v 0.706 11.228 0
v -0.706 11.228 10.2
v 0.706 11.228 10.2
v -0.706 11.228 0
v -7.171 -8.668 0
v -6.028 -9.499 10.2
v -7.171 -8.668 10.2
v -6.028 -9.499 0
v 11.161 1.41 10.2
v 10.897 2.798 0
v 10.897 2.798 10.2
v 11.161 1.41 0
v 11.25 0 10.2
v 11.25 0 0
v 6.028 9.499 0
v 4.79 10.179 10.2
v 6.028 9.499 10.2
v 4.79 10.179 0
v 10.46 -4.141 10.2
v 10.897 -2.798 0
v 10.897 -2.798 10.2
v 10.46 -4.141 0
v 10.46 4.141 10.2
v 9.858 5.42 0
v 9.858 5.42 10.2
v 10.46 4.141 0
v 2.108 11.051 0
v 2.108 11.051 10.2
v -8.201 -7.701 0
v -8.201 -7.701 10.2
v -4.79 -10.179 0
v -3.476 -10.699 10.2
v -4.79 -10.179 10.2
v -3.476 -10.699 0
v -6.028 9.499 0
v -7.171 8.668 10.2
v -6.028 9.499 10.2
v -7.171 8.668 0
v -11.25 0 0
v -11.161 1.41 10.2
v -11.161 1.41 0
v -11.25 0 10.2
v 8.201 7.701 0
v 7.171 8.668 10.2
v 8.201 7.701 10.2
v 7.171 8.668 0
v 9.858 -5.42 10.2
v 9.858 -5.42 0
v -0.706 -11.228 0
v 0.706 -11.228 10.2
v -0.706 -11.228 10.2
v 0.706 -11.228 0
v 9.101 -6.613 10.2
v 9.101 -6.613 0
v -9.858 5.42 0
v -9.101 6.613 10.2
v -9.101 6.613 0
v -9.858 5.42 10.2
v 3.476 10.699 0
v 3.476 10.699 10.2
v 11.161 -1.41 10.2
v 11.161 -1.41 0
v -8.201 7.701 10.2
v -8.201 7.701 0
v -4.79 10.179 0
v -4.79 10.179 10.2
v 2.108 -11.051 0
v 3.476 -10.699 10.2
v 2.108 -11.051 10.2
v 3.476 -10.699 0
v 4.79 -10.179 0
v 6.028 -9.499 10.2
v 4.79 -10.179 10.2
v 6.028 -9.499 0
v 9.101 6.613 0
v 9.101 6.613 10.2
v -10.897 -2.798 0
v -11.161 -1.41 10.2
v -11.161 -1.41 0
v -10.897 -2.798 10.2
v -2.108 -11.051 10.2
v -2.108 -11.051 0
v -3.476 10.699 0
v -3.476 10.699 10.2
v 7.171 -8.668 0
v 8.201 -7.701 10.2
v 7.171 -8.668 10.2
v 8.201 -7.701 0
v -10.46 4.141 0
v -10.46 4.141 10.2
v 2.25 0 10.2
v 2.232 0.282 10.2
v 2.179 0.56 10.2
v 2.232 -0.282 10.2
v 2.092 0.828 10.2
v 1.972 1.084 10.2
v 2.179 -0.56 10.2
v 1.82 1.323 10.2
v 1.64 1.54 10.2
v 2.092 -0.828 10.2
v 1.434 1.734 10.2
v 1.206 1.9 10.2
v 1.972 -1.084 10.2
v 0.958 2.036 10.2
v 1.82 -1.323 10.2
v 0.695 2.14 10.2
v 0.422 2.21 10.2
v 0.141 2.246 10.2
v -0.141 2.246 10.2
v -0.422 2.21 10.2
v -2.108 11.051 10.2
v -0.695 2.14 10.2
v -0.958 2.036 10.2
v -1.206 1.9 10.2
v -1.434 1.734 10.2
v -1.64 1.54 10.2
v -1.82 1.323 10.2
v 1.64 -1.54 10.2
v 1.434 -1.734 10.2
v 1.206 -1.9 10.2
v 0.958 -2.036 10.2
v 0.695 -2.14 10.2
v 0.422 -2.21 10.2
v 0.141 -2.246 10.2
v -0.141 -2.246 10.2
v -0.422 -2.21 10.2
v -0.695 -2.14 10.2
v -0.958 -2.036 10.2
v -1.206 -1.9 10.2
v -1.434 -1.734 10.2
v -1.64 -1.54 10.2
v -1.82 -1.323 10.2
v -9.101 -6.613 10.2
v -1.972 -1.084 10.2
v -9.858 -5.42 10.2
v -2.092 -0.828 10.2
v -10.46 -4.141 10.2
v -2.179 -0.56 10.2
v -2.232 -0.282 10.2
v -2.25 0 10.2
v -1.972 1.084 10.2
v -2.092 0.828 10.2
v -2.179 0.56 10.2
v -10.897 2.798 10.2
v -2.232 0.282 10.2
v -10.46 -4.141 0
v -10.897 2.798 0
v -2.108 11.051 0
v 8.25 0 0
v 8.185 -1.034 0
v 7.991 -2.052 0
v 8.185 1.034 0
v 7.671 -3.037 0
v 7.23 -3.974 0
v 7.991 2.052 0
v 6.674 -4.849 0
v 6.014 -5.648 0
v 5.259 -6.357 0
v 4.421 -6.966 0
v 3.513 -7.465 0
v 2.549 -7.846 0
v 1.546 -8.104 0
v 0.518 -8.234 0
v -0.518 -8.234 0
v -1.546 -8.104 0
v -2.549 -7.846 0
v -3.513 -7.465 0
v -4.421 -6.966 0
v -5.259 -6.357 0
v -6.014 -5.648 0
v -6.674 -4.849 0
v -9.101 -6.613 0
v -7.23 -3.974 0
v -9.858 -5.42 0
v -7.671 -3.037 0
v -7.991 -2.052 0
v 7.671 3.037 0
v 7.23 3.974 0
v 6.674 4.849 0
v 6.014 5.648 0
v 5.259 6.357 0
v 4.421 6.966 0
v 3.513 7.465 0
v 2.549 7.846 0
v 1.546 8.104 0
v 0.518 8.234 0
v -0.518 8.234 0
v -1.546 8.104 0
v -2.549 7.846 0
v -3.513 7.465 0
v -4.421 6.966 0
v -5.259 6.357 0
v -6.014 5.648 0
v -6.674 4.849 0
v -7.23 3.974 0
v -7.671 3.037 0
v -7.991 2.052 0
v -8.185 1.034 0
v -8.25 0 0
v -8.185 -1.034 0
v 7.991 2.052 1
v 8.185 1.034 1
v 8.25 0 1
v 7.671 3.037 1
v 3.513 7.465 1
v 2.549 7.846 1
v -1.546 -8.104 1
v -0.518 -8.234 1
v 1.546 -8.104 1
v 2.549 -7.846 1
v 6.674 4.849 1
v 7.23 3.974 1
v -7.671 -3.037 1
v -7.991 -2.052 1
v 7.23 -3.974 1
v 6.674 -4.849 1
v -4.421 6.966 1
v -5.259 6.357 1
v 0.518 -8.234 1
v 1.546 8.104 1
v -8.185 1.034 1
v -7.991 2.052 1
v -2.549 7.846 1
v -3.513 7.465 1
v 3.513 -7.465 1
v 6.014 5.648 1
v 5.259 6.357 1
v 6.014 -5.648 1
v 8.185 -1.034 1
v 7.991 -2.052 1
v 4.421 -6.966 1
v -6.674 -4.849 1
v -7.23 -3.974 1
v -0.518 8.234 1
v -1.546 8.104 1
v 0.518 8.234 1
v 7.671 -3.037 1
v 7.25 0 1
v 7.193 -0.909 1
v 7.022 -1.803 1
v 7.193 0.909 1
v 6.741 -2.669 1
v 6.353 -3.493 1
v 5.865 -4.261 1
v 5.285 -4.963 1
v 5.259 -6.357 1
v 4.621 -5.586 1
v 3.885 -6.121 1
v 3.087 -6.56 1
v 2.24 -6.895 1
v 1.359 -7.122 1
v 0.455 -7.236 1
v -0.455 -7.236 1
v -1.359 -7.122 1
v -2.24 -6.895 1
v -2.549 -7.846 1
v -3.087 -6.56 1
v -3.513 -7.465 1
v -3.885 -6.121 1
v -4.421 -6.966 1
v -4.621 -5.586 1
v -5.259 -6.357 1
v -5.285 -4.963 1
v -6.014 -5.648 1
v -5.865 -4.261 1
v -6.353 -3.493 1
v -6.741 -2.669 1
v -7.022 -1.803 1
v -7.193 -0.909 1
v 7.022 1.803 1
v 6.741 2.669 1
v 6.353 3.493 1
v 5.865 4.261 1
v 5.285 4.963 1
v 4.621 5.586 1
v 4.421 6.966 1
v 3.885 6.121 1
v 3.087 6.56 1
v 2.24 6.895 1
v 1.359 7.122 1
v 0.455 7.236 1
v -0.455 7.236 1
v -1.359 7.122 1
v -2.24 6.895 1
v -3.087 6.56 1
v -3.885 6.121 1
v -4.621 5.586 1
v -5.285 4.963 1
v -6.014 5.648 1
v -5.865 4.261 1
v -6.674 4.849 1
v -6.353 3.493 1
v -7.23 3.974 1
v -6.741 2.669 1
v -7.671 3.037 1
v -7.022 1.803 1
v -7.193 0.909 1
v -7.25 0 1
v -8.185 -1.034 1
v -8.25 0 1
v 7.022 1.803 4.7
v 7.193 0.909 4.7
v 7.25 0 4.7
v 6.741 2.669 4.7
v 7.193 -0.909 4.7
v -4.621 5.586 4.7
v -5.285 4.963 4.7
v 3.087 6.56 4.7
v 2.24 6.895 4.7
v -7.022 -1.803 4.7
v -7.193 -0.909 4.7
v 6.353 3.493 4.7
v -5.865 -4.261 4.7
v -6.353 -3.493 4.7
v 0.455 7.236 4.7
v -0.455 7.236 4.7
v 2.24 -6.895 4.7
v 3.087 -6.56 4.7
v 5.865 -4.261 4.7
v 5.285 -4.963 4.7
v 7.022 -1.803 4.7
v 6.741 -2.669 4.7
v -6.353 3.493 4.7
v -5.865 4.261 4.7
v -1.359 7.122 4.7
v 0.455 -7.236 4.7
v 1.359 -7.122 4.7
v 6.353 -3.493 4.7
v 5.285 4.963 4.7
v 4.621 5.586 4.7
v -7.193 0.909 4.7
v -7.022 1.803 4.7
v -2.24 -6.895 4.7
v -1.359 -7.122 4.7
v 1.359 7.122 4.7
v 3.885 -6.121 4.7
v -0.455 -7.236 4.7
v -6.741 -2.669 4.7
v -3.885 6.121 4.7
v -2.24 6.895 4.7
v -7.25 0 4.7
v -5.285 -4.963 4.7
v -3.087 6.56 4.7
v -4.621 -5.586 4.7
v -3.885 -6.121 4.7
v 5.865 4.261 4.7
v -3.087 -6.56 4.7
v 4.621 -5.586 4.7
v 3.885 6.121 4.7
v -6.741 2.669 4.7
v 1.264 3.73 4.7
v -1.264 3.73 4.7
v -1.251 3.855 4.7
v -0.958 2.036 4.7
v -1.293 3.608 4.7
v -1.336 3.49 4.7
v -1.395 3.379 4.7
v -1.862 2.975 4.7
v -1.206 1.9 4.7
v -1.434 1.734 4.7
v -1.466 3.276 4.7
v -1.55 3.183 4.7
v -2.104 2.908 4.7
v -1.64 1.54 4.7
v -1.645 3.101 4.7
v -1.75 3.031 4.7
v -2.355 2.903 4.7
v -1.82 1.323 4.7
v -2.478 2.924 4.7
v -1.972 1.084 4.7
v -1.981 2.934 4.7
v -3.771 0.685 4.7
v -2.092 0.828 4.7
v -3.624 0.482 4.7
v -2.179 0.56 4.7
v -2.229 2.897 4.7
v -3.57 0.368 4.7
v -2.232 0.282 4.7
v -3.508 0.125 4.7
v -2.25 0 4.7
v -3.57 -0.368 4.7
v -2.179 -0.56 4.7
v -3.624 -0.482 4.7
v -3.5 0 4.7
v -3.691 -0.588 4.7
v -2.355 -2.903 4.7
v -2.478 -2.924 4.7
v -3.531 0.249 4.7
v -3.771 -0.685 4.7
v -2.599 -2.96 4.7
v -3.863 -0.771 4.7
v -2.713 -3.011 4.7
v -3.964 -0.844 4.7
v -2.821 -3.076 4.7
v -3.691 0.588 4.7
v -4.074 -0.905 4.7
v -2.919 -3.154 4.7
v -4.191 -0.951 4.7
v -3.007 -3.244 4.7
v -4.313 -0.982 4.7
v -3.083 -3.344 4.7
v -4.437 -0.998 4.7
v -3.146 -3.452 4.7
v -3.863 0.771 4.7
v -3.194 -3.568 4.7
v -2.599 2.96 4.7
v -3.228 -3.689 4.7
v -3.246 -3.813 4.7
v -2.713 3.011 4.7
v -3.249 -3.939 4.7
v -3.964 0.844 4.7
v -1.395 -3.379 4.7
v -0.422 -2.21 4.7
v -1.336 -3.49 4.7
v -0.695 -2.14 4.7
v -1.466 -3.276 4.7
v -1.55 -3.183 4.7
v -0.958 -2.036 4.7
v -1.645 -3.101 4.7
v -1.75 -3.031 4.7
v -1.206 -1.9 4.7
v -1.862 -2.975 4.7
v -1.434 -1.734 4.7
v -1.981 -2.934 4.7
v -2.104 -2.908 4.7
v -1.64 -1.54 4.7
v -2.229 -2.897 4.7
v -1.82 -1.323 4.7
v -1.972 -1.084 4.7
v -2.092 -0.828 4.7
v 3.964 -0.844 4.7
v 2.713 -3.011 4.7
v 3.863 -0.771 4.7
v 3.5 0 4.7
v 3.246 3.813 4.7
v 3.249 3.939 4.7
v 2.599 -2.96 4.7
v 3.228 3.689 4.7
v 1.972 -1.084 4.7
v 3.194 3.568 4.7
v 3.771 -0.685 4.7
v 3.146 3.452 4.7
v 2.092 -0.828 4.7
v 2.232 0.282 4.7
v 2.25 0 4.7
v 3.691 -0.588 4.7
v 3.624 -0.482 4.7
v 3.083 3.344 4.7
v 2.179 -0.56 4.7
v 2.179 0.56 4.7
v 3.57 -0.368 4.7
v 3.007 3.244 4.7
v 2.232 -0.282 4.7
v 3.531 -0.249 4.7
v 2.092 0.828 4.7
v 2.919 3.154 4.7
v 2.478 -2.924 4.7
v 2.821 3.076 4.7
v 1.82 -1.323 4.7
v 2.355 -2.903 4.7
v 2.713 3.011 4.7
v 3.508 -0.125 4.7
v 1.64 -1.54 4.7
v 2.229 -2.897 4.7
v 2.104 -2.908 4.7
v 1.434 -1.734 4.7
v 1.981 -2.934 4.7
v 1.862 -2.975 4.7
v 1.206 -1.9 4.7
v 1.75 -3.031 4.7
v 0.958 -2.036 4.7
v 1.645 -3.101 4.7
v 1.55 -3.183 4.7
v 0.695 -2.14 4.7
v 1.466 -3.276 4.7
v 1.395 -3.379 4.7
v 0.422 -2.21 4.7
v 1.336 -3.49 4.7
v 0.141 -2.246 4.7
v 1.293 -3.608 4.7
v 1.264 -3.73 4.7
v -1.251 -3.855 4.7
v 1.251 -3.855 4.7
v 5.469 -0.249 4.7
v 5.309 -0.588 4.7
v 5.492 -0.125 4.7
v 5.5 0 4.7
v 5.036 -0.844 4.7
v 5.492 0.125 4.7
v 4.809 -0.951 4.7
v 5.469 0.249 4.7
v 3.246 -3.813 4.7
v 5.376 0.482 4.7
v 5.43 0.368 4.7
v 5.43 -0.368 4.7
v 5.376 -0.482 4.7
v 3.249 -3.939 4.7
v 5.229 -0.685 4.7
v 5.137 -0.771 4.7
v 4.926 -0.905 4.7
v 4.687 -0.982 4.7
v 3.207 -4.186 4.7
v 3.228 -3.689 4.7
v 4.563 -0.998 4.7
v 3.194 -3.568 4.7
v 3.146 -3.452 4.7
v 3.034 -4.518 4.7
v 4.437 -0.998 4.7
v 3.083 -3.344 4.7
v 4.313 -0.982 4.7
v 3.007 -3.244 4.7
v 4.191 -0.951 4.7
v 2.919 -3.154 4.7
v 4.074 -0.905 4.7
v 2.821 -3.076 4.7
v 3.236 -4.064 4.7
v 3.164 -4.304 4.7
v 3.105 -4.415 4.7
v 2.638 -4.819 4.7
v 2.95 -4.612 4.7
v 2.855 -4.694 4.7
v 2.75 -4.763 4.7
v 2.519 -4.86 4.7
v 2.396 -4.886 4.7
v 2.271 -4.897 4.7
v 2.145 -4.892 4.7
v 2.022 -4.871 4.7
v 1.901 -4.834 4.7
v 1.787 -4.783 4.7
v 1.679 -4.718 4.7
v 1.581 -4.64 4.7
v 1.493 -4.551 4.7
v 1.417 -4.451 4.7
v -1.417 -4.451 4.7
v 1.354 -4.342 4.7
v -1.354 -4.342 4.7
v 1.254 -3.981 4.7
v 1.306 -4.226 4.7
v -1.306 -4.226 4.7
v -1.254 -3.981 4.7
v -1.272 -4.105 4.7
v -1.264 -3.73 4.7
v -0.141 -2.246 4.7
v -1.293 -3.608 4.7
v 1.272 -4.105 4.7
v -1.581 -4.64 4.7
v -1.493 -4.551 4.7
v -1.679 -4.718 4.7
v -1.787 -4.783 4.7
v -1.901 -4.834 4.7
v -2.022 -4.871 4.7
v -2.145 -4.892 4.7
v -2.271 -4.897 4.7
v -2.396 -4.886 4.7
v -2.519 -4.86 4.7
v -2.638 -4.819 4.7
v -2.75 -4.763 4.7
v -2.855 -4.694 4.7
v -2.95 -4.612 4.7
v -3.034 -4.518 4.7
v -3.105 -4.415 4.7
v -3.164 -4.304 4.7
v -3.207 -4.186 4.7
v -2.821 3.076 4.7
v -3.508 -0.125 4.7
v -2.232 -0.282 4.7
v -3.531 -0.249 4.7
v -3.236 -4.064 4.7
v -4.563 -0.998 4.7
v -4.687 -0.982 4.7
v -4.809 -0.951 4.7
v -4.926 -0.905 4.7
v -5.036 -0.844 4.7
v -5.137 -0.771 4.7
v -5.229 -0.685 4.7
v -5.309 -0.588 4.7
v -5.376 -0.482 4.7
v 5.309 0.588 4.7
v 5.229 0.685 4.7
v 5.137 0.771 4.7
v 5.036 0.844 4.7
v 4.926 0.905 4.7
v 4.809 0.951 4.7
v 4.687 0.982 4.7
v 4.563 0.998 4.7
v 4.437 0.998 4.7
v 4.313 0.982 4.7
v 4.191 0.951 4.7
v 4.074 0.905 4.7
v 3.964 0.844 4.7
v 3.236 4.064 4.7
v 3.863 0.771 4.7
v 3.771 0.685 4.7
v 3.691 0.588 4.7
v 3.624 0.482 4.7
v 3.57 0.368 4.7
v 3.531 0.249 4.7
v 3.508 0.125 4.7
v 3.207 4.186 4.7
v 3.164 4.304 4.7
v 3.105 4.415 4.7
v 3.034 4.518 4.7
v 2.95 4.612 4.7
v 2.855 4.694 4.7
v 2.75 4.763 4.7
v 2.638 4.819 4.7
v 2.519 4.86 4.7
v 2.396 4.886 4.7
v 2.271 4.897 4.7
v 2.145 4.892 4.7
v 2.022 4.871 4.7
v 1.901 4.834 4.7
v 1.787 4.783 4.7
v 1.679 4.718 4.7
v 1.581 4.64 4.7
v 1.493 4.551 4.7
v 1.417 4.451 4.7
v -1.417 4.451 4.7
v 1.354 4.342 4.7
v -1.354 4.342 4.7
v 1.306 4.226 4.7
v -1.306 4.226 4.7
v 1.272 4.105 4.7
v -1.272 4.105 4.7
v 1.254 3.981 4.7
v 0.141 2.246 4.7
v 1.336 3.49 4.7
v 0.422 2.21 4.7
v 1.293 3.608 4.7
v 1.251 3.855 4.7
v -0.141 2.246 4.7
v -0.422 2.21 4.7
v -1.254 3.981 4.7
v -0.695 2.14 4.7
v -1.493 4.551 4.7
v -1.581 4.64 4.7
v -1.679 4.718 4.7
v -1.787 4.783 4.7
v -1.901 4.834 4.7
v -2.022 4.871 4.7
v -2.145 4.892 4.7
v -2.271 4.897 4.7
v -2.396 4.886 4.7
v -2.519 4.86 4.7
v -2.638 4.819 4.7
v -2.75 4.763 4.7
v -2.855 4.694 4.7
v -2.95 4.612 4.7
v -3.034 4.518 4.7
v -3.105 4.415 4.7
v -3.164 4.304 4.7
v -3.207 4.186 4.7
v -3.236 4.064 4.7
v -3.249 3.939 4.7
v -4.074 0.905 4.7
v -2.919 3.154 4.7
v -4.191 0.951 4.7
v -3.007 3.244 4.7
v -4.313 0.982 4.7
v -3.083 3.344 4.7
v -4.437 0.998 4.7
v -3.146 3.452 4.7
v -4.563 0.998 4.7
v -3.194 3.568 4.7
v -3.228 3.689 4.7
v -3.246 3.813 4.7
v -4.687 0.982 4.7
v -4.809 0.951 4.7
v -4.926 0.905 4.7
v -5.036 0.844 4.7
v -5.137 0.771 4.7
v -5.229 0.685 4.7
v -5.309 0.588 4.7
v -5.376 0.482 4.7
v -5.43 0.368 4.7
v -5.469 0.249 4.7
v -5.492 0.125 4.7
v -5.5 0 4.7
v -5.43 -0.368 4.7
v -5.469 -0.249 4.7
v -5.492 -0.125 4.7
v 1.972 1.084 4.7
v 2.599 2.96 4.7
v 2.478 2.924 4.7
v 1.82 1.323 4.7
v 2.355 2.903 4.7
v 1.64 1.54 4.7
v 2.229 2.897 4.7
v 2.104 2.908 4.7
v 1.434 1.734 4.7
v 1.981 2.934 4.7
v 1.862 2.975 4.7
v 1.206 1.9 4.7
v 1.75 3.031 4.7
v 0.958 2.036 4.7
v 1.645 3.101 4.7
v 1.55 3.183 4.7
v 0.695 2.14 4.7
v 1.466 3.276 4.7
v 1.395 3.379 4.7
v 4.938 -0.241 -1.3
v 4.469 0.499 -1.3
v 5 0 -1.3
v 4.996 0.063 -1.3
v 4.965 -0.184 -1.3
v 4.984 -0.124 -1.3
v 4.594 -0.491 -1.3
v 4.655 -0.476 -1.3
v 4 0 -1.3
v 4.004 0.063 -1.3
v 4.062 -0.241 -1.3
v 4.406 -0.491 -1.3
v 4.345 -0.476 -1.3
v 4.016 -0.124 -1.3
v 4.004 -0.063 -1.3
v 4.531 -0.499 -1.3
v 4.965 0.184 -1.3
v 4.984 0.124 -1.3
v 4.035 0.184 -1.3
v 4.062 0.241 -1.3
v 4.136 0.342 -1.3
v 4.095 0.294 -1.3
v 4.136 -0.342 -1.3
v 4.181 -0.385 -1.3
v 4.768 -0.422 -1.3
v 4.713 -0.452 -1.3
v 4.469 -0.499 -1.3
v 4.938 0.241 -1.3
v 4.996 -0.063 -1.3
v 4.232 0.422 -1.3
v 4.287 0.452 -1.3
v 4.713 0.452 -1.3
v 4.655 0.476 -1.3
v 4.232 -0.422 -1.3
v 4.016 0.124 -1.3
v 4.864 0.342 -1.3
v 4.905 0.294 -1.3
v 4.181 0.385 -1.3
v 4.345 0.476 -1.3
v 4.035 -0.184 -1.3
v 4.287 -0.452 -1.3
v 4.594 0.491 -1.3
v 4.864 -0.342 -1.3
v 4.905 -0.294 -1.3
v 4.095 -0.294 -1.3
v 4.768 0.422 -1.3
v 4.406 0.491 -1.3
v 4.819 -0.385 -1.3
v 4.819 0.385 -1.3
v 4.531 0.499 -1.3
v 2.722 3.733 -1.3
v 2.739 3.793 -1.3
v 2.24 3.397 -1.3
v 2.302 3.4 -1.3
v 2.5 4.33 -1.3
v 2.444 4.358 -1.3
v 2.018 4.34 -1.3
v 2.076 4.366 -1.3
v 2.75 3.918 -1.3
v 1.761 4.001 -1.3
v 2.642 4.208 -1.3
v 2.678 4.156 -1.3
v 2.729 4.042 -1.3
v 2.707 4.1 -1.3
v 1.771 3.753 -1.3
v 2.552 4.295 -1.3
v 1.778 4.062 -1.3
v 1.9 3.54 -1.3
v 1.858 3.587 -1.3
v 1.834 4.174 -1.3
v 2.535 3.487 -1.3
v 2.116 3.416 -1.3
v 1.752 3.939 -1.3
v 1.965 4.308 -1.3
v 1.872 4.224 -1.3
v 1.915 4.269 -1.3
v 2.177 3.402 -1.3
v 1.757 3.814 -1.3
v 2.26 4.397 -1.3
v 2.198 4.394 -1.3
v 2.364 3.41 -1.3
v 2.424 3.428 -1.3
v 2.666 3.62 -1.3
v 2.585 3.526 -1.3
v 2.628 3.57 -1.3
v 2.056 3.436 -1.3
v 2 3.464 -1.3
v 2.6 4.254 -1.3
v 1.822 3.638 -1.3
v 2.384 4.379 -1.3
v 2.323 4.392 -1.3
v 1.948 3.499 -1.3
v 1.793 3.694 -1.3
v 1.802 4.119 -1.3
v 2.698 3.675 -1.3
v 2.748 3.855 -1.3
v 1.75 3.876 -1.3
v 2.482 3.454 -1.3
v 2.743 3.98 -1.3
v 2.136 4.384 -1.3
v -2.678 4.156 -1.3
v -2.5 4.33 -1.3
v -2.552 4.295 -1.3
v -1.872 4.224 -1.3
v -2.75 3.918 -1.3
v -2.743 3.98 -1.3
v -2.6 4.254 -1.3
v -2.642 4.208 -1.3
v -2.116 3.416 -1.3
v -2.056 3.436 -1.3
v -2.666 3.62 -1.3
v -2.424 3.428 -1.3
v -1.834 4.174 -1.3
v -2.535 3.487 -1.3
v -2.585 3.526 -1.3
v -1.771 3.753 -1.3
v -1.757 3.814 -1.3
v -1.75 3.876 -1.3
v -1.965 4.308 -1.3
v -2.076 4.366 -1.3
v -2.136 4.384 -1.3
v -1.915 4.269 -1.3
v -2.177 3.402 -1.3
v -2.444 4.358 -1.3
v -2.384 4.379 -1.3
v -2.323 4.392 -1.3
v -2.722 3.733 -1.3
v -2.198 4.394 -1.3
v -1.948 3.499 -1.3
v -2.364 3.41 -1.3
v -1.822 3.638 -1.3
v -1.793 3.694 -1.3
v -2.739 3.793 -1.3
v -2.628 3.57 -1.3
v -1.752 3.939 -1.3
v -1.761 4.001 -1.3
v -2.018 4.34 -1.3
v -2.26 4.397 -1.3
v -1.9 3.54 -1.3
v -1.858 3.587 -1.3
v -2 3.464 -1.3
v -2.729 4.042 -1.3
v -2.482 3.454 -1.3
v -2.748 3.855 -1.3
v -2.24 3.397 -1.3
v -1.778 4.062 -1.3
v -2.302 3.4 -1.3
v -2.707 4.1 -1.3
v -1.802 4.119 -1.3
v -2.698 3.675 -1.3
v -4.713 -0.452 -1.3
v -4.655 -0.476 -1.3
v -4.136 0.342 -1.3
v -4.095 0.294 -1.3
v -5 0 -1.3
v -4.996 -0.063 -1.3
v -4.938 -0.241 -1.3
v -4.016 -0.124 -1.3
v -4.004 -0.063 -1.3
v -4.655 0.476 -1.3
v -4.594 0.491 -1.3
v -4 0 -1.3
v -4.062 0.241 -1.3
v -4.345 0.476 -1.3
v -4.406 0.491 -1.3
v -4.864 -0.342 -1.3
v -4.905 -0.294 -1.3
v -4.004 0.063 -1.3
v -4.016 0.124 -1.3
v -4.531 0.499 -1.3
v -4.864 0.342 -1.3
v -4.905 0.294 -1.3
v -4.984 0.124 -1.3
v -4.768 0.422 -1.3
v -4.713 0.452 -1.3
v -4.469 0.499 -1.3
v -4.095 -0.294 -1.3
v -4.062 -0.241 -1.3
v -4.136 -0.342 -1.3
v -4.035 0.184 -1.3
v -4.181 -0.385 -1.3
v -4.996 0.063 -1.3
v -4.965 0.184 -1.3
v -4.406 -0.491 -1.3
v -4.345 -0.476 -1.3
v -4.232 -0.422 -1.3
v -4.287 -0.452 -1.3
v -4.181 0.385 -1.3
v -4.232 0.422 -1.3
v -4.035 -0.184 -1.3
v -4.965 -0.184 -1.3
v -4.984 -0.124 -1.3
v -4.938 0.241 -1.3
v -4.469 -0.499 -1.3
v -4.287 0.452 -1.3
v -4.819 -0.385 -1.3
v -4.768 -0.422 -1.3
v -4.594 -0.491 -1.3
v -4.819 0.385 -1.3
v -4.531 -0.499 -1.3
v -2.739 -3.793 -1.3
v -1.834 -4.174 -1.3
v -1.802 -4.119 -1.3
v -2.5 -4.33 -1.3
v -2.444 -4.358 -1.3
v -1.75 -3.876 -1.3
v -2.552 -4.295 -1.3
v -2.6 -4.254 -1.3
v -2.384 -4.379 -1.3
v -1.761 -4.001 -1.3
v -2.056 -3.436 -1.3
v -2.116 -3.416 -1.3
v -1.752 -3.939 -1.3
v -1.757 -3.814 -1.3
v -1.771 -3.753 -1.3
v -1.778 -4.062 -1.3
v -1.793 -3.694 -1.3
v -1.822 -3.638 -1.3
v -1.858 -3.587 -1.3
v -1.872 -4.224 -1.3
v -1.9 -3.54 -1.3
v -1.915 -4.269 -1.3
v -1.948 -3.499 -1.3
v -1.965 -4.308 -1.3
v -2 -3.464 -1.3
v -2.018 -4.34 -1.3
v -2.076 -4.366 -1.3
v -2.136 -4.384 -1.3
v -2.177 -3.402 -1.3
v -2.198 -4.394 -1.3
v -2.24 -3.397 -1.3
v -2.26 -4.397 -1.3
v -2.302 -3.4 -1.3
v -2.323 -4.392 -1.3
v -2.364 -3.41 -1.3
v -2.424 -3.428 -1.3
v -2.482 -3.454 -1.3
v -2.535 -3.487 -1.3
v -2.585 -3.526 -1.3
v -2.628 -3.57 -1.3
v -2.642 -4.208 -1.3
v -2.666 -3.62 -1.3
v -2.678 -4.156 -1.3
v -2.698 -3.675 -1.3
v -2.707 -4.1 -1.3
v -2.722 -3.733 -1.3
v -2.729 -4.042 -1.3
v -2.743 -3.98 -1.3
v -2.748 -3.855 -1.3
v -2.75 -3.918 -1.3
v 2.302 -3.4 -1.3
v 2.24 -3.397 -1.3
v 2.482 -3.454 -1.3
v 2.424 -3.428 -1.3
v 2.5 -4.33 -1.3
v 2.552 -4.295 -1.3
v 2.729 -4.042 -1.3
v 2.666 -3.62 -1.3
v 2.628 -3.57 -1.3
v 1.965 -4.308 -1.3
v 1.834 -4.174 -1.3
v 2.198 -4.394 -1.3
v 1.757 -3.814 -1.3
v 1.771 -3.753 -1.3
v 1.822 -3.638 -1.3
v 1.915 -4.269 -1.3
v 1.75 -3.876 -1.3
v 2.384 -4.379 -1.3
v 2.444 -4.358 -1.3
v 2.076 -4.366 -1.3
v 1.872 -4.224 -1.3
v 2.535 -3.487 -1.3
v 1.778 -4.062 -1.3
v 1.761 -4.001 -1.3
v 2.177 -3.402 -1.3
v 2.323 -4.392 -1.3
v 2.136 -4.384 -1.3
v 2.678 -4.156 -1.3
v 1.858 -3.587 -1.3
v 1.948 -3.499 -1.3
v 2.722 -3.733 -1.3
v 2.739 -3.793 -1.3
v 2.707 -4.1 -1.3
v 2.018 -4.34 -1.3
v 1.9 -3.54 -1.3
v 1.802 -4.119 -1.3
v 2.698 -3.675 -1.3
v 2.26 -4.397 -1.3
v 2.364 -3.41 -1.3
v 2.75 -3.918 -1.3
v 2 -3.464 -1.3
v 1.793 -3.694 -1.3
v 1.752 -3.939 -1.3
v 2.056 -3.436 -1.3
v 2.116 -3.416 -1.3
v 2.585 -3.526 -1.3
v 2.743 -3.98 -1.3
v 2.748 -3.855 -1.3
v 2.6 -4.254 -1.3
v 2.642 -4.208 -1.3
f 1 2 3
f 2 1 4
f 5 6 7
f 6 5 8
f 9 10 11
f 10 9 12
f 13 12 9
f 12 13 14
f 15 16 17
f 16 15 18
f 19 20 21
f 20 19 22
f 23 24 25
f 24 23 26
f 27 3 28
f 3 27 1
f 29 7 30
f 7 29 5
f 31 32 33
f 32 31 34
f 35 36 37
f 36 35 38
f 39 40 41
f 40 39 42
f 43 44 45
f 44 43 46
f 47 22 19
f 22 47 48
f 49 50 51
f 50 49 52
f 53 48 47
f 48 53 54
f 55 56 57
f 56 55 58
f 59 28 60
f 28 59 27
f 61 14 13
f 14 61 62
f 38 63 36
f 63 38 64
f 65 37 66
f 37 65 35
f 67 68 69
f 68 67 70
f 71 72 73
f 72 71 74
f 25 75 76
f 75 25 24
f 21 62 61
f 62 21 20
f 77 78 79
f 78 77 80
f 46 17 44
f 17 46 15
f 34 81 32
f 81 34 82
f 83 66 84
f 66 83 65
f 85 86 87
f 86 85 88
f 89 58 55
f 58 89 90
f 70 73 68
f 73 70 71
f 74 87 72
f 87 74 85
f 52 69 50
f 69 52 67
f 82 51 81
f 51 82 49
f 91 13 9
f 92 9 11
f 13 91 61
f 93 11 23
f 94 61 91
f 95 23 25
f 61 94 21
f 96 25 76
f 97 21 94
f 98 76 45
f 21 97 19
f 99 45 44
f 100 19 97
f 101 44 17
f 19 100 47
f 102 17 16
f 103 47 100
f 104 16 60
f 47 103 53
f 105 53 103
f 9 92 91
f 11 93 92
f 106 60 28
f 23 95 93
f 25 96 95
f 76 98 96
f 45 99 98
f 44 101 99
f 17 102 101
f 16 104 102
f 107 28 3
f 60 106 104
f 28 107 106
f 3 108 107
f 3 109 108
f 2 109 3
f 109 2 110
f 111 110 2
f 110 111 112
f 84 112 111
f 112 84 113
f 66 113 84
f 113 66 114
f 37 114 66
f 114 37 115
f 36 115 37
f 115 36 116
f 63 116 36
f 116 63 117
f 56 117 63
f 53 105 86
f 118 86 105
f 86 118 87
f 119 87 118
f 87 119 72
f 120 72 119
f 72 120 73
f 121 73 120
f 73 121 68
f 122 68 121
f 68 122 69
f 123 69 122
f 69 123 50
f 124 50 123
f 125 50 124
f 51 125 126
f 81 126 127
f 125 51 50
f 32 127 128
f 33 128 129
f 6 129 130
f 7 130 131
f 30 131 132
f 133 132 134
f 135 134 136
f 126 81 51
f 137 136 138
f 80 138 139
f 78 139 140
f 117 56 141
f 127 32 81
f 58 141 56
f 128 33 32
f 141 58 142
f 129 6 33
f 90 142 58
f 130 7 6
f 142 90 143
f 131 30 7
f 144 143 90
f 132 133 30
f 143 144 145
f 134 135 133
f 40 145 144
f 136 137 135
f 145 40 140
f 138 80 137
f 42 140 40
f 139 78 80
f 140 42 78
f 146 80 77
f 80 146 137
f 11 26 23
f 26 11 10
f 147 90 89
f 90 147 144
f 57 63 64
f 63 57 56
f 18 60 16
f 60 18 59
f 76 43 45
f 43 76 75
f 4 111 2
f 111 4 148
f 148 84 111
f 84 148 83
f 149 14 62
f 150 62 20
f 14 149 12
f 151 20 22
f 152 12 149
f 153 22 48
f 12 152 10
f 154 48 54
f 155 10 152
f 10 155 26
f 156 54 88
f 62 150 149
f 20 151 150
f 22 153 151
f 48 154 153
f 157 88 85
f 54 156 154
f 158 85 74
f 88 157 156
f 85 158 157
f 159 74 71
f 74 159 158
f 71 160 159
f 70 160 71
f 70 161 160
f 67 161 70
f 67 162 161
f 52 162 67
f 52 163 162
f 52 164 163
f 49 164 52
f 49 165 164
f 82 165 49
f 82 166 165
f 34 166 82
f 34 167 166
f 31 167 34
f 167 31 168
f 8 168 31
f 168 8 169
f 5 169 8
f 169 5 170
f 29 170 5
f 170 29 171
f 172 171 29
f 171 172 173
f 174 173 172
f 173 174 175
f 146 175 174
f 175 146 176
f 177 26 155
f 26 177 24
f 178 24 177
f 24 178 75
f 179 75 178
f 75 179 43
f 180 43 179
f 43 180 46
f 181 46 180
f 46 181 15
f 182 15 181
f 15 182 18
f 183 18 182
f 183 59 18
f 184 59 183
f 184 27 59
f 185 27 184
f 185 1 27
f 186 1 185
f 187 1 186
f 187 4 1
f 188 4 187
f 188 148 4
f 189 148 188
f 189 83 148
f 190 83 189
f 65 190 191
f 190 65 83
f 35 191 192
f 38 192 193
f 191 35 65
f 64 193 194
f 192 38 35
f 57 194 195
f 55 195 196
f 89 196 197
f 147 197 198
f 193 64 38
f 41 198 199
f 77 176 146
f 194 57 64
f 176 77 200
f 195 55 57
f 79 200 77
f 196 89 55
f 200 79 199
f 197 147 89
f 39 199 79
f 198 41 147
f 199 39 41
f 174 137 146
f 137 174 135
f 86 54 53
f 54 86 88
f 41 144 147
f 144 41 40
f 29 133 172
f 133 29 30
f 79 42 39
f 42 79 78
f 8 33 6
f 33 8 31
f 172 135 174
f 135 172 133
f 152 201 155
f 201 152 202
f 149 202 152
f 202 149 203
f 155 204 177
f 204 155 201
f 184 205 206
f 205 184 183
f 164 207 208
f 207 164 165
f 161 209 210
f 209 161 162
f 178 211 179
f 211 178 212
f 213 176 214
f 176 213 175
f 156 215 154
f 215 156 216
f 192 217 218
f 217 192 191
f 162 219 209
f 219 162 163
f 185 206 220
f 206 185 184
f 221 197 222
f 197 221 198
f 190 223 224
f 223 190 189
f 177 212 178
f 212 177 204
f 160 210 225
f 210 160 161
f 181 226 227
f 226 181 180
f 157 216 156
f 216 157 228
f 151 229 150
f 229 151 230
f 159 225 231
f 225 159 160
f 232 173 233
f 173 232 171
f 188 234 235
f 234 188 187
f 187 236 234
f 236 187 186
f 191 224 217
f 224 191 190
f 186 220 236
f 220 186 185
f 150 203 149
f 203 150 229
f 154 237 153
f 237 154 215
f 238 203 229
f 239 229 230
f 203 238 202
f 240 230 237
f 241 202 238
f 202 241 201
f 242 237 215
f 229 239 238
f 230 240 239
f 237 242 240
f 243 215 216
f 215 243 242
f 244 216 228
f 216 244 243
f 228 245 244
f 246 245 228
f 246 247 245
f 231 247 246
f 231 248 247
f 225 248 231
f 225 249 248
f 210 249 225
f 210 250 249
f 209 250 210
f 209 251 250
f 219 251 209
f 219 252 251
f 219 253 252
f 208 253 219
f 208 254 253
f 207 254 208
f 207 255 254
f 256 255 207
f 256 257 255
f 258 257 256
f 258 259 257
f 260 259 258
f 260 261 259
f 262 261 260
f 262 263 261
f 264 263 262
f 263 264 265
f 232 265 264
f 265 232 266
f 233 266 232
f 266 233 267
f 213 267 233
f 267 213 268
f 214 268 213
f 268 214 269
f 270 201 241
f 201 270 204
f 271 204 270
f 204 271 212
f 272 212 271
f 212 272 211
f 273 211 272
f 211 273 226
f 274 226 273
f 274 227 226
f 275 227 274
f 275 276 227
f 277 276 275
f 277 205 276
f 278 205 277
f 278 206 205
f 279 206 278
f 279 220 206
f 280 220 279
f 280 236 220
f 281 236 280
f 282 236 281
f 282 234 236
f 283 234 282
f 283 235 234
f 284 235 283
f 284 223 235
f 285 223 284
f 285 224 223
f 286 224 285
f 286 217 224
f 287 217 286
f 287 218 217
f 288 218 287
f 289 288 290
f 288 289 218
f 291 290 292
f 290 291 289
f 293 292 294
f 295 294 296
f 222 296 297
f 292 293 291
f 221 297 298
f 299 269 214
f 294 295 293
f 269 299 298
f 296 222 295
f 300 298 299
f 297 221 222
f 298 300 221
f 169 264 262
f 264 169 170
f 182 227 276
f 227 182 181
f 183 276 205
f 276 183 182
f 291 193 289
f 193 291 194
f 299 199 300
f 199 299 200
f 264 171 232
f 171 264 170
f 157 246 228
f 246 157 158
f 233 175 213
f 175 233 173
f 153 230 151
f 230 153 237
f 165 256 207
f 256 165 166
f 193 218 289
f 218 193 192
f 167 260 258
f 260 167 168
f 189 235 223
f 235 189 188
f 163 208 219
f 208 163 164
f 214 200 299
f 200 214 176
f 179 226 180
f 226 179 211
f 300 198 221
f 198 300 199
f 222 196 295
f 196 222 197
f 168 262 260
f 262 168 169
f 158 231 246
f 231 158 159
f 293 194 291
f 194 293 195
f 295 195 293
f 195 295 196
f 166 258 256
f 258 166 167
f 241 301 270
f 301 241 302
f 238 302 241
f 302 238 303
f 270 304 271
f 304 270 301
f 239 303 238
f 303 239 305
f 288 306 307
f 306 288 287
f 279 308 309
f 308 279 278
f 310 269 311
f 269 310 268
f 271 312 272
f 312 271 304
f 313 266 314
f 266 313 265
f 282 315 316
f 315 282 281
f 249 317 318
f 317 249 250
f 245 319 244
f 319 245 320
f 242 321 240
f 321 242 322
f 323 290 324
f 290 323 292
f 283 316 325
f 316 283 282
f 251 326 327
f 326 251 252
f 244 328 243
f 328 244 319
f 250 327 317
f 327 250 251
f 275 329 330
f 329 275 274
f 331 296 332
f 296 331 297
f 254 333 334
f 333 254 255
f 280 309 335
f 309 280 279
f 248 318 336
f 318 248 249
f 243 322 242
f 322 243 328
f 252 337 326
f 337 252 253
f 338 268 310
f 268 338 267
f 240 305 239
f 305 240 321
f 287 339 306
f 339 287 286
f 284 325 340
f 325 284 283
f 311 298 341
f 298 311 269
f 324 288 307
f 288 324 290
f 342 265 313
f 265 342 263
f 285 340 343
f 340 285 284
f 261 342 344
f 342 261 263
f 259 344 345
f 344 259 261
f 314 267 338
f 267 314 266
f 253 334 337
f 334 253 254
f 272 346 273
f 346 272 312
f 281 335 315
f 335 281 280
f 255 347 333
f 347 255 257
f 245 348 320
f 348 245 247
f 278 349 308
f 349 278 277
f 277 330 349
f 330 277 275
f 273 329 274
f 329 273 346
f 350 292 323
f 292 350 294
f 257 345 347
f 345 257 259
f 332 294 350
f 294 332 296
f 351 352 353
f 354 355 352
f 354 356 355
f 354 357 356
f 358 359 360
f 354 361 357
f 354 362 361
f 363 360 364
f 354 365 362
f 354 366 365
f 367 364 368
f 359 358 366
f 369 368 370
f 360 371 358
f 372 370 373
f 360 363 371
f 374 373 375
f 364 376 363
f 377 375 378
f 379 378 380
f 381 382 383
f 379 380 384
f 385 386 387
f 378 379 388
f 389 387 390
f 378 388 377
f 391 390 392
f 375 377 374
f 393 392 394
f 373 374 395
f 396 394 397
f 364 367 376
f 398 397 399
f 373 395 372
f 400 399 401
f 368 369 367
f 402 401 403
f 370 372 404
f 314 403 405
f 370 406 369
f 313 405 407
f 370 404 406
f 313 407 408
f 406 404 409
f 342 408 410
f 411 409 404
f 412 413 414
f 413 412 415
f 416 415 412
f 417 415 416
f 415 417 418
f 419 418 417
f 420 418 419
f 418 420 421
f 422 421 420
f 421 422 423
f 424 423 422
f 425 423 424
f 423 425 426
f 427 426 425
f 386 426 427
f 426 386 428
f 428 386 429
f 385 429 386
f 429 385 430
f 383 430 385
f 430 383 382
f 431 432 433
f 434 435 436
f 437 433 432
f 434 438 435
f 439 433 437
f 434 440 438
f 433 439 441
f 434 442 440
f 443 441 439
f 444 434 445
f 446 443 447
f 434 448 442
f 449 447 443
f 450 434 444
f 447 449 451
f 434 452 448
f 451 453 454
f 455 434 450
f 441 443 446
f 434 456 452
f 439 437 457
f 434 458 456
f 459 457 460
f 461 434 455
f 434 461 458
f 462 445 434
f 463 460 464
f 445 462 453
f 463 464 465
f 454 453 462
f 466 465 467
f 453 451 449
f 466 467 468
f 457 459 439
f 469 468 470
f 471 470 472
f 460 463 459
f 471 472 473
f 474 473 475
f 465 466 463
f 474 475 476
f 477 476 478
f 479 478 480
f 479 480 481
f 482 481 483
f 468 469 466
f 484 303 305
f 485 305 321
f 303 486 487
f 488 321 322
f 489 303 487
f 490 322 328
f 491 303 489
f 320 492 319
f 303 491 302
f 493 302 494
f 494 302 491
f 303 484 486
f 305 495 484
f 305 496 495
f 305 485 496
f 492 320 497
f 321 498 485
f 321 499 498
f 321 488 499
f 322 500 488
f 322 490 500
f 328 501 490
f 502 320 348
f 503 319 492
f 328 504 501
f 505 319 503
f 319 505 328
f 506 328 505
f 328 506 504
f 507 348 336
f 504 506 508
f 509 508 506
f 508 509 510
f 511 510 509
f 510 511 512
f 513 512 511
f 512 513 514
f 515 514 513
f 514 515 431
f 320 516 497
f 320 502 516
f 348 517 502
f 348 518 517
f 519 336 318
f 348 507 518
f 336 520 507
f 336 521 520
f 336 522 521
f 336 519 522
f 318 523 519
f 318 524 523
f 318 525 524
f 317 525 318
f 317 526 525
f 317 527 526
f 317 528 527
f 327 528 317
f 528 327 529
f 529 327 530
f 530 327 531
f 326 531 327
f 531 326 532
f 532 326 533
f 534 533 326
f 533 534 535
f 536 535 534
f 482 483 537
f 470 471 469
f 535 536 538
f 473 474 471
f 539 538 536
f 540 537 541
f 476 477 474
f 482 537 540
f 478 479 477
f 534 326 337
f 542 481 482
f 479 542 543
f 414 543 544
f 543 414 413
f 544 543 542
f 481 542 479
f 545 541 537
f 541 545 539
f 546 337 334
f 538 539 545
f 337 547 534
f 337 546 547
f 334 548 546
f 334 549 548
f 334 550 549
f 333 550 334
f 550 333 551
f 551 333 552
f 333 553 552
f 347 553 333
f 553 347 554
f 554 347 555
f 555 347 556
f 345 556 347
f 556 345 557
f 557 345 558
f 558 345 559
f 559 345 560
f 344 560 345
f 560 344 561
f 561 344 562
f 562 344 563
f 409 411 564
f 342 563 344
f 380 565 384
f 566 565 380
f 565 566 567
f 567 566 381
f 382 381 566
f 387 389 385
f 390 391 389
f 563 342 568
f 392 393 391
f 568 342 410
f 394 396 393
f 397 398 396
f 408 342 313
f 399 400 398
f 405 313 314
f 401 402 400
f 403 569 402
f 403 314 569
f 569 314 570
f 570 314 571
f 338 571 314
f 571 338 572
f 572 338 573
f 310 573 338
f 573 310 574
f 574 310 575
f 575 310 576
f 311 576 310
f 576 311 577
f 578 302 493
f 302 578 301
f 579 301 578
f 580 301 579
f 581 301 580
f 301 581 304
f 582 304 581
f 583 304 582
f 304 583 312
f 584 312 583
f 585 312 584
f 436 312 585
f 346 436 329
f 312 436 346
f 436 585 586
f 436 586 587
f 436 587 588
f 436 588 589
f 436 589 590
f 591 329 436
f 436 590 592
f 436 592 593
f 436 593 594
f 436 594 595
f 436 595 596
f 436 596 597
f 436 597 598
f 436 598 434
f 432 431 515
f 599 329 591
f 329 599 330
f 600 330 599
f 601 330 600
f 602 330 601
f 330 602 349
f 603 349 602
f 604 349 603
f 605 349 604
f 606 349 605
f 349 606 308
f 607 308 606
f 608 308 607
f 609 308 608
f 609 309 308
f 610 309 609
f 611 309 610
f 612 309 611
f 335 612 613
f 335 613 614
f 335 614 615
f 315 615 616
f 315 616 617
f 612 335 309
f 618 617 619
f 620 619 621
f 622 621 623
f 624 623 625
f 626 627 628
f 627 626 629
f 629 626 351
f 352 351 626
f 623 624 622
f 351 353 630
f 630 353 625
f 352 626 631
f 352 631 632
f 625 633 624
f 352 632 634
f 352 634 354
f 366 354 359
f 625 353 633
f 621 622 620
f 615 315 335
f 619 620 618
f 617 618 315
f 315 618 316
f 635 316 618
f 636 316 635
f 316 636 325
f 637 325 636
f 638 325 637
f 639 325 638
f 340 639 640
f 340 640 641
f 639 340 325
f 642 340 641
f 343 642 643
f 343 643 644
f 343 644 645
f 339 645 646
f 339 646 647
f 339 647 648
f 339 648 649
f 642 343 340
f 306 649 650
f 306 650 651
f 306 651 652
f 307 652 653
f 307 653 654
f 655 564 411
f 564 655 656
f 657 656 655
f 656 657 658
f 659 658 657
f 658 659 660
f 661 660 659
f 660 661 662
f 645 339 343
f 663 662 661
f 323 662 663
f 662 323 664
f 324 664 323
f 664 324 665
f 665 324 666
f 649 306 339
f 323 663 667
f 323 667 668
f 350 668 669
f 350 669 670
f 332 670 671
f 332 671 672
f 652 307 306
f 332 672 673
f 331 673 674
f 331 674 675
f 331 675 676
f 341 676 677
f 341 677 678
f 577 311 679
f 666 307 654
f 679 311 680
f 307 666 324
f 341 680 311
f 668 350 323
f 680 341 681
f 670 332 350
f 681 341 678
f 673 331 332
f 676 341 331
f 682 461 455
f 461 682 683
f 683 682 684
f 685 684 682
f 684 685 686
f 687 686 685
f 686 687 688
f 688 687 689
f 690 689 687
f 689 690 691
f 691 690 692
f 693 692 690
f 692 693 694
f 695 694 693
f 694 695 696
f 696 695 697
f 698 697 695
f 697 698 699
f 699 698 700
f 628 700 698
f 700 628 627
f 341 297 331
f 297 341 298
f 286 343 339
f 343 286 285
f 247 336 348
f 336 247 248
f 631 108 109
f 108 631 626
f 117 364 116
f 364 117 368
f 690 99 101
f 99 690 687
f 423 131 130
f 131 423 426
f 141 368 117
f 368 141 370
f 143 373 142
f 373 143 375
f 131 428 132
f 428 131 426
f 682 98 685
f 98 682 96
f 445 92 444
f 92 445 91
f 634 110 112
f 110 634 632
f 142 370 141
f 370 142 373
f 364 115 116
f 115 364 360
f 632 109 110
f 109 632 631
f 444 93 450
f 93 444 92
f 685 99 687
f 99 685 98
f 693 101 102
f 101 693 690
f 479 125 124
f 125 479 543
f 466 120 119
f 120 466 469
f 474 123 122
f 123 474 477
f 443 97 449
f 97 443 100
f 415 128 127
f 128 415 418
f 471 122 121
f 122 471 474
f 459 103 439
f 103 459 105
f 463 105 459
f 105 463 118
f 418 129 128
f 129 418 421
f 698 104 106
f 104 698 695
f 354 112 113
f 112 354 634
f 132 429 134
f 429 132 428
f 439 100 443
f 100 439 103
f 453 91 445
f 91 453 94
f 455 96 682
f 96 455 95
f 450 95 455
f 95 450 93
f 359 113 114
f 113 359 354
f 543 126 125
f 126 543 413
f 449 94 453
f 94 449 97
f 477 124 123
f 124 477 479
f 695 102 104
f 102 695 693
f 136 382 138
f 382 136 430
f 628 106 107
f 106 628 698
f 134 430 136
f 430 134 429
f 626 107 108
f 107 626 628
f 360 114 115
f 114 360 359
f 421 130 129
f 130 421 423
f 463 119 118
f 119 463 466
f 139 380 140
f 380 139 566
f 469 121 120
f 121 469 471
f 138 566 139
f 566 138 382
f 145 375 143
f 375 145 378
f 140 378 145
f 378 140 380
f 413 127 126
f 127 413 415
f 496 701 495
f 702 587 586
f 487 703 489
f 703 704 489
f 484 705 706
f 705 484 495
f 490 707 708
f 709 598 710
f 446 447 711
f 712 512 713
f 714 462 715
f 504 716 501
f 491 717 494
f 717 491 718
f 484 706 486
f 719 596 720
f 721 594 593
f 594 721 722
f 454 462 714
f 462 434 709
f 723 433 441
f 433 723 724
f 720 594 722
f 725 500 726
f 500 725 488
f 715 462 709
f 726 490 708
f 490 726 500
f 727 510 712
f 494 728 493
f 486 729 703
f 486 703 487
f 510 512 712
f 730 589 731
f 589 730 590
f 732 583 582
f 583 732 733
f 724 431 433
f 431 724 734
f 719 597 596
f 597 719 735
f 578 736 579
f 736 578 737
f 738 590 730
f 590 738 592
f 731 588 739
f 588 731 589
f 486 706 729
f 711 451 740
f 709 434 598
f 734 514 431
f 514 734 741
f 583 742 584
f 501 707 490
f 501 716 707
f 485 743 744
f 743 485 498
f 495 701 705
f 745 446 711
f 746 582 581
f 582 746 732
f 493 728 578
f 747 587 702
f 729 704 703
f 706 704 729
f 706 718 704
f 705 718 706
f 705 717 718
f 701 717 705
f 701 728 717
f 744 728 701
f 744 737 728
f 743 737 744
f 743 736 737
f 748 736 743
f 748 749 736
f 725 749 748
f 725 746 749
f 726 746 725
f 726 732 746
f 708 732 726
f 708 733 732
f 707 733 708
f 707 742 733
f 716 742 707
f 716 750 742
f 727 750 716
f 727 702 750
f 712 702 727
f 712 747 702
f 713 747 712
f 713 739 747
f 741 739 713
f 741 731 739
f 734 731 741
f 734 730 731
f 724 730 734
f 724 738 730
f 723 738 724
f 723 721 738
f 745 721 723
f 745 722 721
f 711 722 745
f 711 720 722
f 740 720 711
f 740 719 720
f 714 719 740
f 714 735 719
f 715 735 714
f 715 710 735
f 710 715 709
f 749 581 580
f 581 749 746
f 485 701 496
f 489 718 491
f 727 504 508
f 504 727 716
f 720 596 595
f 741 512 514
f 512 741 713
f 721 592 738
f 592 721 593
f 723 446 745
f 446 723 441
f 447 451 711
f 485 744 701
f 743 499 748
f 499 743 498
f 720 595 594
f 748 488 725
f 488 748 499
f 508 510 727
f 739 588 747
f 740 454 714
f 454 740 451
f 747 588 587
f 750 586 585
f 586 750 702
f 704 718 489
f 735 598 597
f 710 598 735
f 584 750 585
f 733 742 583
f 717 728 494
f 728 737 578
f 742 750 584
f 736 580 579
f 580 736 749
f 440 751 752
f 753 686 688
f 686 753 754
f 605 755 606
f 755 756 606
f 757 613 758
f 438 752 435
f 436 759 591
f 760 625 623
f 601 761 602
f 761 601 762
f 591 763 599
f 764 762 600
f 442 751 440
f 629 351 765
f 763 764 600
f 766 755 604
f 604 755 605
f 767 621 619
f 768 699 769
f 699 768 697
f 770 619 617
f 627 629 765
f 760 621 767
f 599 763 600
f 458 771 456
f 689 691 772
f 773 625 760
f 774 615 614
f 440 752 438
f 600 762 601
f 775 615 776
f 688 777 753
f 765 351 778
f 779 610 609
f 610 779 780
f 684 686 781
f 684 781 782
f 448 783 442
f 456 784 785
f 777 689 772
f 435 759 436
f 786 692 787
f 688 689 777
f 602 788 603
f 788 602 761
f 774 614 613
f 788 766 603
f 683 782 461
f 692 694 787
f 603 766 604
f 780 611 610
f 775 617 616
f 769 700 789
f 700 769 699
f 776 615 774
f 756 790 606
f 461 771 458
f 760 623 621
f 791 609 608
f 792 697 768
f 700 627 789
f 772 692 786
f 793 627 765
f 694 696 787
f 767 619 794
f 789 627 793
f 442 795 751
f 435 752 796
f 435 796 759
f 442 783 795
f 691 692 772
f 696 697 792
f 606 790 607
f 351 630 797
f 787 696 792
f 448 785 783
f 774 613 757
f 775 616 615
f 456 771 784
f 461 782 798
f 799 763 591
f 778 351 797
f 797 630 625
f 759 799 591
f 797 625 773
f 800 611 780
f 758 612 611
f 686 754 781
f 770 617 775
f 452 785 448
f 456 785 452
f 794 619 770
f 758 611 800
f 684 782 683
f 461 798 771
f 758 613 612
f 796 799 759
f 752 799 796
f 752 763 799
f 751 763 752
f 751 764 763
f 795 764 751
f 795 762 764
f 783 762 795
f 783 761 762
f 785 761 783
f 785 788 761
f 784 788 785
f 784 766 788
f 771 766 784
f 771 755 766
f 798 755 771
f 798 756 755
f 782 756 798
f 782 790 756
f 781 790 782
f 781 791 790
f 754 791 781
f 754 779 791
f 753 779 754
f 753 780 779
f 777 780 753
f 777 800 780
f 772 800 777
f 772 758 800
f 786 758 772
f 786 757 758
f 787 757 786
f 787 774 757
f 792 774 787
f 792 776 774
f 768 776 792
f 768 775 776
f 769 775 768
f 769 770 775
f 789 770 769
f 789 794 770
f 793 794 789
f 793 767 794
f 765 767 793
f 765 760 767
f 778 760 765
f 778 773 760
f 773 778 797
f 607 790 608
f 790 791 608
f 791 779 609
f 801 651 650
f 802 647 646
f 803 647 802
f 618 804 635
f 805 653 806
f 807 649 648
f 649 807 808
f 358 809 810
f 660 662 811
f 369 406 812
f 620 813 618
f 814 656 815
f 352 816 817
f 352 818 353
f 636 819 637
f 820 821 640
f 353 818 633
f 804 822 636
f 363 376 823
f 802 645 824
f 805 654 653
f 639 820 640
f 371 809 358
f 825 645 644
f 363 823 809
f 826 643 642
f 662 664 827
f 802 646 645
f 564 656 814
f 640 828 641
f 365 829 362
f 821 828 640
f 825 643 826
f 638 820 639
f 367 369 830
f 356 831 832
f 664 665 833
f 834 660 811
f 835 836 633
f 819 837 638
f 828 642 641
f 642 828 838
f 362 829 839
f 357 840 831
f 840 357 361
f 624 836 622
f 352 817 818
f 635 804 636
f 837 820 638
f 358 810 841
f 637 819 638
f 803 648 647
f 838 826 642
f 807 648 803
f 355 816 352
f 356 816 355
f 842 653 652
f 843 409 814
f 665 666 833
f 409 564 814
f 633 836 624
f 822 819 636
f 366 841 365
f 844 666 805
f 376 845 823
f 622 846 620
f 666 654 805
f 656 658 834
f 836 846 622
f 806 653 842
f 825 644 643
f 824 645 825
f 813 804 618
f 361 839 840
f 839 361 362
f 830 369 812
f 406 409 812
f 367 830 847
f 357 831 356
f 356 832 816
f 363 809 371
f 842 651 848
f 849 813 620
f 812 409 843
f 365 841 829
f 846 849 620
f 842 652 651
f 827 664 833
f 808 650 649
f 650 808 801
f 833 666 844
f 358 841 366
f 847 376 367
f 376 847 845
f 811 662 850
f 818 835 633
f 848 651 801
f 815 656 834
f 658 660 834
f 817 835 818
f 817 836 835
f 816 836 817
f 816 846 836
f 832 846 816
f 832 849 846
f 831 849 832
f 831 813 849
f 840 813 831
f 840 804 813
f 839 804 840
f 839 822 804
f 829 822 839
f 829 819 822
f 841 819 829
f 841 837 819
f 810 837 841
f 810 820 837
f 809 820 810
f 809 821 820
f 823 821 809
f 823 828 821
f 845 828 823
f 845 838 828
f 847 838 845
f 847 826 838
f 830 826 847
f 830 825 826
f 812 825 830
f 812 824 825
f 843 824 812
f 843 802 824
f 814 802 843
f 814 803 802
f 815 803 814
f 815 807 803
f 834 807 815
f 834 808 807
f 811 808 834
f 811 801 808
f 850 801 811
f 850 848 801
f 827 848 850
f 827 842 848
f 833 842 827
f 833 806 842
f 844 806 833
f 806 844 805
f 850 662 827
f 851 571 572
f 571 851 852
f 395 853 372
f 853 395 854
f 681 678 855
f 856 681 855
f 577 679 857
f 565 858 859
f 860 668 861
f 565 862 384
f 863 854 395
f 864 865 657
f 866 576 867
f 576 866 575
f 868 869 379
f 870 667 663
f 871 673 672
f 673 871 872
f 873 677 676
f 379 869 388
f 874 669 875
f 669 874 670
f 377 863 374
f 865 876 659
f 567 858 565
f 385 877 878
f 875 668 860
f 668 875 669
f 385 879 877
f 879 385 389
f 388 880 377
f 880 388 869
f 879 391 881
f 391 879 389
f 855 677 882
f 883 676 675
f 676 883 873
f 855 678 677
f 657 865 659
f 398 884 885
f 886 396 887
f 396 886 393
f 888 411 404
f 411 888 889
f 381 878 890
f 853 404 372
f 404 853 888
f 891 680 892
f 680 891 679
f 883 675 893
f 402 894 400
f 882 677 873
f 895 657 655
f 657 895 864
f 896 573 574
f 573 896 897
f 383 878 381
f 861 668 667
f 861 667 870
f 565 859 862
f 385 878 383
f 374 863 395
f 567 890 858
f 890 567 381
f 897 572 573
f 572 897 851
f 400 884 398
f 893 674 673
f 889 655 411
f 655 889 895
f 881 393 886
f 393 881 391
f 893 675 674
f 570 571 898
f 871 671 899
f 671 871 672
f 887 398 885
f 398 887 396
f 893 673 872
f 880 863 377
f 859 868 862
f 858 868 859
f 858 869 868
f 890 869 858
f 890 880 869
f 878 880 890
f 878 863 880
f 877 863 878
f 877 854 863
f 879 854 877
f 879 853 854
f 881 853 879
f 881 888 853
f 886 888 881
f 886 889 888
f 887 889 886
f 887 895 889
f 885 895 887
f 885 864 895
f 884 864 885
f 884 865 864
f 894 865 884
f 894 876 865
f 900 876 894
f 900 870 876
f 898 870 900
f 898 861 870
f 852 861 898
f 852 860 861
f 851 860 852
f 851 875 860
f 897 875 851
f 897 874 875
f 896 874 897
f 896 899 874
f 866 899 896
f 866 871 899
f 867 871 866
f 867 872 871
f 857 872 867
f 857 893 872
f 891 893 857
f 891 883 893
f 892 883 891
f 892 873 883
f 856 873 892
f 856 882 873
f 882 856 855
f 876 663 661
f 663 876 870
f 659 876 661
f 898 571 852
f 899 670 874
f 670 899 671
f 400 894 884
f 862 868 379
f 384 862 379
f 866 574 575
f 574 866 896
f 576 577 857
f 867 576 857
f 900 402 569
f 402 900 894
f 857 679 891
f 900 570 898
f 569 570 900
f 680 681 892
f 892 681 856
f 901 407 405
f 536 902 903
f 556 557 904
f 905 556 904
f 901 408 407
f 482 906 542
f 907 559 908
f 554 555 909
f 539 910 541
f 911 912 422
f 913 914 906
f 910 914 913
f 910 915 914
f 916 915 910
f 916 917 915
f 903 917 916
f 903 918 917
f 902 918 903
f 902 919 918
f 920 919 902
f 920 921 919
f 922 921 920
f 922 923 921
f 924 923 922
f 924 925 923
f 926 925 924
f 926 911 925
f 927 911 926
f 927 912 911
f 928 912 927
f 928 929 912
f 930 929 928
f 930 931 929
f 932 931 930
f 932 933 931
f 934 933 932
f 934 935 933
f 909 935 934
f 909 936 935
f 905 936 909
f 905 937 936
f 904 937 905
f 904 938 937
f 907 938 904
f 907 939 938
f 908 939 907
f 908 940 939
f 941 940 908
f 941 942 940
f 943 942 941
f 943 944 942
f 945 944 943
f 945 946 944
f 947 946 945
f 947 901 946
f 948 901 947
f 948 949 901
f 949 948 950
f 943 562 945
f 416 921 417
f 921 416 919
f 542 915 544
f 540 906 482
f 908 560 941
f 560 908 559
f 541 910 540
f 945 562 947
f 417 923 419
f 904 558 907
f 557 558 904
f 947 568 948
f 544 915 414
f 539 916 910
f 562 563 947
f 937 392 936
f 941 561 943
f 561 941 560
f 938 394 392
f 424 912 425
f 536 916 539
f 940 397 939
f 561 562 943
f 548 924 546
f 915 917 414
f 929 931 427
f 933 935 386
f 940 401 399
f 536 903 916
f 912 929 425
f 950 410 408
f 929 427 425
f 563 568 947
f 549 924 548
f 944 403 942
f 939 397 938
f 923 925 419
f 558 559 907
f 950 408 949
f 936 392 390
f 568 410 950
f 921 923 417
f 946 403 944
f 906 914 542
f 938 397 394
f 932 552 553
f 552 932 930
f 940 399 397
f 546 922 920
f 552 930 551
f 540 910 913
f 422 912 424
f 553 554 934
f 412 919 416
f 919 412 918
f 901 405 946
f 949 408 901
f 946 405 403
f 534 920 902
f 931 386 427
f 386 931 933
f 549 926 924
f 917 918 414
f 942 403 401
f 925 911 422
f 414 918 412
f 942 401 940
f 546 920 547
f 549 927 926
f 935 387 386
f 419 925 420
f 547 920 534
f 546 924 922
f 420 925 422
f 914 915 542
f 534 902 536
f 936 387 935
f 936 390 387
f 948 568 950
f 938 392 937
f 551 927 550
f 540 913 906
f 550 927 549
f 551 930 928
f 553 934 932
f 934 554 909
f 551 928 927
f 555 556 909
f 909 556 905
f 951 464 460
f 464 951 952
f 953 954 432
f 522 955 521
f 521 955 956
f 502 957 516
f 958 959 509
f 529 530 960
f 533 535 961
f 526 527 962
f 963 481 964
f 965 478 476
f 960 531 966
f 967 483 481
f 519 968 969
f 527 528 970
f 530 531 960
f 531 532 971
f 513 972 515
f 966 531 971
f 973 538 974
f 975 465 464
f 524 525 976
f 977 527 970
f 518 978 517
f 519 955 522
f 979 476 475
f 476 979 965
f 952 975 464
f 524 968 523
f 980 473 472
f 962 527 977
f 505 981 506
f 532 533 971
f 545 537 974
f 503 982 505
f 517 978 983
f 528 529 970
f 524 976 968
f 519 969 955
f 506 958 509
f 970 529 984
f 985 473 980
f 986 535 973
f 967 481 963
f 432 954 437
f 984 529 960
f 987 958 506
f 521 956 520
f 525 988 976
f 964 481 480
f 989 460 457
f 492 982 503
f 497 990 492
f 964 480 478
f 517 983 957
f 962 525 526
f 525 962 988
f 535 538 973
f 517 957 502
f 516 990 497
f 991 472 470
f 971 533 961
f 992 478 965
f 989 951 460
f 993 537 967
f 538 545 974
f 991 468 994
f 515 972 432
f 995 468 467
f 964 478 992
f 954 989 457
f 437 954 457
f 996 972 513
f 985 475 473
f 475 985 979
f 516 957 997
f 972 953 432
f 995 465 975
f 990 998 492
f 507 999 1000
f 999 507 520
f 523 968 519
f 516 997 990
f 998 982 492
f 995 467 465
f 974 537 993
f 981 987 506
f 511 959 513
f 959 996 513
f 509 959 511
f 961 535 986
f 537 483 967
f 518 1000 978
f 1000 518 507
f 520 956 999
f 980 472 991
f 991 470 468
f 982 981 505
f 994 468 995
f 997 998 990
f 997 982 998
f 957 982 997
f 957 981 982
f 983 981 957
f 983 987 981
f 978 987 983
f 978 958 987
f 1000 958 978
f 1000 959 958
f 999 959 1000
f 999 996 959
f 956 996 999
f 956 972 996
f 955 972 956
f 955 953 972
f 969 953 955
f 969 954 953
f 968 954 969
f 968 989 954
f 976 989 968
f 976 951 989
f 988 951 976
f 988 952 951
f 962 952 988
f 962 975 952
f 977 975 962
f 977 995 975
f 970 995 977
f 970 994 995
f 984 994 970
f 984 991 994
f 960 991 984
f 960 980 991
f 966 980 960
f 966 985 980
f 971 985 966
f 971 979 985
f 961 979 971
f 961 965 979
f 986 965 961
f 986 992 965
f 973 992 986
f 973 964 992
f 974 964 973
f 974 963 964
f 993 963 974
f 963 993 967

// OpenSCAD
h = 5.5;

pad = 0.5;

max_d = 27;
intr_top_d = 14 + pad;
top_h = 3.7;
intr_bottom_d = 16 + pad;
bottom_h = 1;
extr_d = min(max_d, intr_bottom_d + 6);
bolt_d = 4 + pad;
bolt_cap_d = 7 + pad;
full_h = bottom_h + top_h + h;

angle_step = 360/6;
cone_d1 = 1;
cone_d2 = 2;
cone_h = 6 ;

$fn = 50;

module round_thing() {
  difference() {
    cylinder(d=extr_d, h=full_h);
    cylinder(d=intr_bottom_d, h=bottom_h);
    cylinder(d=intr_top_d, h=bottom_h+top_h);
    cylinder(d=bolt_d, h=full_h);
  }
  for(i=[0:angle_step:360]) {
    rotate([0, 0, i]) {
      translate([4.5, 0, bottom_h+top_h-cone_h]) {
        cylinder(d1=cone_d1, d2=cone_d2, h=cone_h);
      }
    }
  }
}

round_thing();
